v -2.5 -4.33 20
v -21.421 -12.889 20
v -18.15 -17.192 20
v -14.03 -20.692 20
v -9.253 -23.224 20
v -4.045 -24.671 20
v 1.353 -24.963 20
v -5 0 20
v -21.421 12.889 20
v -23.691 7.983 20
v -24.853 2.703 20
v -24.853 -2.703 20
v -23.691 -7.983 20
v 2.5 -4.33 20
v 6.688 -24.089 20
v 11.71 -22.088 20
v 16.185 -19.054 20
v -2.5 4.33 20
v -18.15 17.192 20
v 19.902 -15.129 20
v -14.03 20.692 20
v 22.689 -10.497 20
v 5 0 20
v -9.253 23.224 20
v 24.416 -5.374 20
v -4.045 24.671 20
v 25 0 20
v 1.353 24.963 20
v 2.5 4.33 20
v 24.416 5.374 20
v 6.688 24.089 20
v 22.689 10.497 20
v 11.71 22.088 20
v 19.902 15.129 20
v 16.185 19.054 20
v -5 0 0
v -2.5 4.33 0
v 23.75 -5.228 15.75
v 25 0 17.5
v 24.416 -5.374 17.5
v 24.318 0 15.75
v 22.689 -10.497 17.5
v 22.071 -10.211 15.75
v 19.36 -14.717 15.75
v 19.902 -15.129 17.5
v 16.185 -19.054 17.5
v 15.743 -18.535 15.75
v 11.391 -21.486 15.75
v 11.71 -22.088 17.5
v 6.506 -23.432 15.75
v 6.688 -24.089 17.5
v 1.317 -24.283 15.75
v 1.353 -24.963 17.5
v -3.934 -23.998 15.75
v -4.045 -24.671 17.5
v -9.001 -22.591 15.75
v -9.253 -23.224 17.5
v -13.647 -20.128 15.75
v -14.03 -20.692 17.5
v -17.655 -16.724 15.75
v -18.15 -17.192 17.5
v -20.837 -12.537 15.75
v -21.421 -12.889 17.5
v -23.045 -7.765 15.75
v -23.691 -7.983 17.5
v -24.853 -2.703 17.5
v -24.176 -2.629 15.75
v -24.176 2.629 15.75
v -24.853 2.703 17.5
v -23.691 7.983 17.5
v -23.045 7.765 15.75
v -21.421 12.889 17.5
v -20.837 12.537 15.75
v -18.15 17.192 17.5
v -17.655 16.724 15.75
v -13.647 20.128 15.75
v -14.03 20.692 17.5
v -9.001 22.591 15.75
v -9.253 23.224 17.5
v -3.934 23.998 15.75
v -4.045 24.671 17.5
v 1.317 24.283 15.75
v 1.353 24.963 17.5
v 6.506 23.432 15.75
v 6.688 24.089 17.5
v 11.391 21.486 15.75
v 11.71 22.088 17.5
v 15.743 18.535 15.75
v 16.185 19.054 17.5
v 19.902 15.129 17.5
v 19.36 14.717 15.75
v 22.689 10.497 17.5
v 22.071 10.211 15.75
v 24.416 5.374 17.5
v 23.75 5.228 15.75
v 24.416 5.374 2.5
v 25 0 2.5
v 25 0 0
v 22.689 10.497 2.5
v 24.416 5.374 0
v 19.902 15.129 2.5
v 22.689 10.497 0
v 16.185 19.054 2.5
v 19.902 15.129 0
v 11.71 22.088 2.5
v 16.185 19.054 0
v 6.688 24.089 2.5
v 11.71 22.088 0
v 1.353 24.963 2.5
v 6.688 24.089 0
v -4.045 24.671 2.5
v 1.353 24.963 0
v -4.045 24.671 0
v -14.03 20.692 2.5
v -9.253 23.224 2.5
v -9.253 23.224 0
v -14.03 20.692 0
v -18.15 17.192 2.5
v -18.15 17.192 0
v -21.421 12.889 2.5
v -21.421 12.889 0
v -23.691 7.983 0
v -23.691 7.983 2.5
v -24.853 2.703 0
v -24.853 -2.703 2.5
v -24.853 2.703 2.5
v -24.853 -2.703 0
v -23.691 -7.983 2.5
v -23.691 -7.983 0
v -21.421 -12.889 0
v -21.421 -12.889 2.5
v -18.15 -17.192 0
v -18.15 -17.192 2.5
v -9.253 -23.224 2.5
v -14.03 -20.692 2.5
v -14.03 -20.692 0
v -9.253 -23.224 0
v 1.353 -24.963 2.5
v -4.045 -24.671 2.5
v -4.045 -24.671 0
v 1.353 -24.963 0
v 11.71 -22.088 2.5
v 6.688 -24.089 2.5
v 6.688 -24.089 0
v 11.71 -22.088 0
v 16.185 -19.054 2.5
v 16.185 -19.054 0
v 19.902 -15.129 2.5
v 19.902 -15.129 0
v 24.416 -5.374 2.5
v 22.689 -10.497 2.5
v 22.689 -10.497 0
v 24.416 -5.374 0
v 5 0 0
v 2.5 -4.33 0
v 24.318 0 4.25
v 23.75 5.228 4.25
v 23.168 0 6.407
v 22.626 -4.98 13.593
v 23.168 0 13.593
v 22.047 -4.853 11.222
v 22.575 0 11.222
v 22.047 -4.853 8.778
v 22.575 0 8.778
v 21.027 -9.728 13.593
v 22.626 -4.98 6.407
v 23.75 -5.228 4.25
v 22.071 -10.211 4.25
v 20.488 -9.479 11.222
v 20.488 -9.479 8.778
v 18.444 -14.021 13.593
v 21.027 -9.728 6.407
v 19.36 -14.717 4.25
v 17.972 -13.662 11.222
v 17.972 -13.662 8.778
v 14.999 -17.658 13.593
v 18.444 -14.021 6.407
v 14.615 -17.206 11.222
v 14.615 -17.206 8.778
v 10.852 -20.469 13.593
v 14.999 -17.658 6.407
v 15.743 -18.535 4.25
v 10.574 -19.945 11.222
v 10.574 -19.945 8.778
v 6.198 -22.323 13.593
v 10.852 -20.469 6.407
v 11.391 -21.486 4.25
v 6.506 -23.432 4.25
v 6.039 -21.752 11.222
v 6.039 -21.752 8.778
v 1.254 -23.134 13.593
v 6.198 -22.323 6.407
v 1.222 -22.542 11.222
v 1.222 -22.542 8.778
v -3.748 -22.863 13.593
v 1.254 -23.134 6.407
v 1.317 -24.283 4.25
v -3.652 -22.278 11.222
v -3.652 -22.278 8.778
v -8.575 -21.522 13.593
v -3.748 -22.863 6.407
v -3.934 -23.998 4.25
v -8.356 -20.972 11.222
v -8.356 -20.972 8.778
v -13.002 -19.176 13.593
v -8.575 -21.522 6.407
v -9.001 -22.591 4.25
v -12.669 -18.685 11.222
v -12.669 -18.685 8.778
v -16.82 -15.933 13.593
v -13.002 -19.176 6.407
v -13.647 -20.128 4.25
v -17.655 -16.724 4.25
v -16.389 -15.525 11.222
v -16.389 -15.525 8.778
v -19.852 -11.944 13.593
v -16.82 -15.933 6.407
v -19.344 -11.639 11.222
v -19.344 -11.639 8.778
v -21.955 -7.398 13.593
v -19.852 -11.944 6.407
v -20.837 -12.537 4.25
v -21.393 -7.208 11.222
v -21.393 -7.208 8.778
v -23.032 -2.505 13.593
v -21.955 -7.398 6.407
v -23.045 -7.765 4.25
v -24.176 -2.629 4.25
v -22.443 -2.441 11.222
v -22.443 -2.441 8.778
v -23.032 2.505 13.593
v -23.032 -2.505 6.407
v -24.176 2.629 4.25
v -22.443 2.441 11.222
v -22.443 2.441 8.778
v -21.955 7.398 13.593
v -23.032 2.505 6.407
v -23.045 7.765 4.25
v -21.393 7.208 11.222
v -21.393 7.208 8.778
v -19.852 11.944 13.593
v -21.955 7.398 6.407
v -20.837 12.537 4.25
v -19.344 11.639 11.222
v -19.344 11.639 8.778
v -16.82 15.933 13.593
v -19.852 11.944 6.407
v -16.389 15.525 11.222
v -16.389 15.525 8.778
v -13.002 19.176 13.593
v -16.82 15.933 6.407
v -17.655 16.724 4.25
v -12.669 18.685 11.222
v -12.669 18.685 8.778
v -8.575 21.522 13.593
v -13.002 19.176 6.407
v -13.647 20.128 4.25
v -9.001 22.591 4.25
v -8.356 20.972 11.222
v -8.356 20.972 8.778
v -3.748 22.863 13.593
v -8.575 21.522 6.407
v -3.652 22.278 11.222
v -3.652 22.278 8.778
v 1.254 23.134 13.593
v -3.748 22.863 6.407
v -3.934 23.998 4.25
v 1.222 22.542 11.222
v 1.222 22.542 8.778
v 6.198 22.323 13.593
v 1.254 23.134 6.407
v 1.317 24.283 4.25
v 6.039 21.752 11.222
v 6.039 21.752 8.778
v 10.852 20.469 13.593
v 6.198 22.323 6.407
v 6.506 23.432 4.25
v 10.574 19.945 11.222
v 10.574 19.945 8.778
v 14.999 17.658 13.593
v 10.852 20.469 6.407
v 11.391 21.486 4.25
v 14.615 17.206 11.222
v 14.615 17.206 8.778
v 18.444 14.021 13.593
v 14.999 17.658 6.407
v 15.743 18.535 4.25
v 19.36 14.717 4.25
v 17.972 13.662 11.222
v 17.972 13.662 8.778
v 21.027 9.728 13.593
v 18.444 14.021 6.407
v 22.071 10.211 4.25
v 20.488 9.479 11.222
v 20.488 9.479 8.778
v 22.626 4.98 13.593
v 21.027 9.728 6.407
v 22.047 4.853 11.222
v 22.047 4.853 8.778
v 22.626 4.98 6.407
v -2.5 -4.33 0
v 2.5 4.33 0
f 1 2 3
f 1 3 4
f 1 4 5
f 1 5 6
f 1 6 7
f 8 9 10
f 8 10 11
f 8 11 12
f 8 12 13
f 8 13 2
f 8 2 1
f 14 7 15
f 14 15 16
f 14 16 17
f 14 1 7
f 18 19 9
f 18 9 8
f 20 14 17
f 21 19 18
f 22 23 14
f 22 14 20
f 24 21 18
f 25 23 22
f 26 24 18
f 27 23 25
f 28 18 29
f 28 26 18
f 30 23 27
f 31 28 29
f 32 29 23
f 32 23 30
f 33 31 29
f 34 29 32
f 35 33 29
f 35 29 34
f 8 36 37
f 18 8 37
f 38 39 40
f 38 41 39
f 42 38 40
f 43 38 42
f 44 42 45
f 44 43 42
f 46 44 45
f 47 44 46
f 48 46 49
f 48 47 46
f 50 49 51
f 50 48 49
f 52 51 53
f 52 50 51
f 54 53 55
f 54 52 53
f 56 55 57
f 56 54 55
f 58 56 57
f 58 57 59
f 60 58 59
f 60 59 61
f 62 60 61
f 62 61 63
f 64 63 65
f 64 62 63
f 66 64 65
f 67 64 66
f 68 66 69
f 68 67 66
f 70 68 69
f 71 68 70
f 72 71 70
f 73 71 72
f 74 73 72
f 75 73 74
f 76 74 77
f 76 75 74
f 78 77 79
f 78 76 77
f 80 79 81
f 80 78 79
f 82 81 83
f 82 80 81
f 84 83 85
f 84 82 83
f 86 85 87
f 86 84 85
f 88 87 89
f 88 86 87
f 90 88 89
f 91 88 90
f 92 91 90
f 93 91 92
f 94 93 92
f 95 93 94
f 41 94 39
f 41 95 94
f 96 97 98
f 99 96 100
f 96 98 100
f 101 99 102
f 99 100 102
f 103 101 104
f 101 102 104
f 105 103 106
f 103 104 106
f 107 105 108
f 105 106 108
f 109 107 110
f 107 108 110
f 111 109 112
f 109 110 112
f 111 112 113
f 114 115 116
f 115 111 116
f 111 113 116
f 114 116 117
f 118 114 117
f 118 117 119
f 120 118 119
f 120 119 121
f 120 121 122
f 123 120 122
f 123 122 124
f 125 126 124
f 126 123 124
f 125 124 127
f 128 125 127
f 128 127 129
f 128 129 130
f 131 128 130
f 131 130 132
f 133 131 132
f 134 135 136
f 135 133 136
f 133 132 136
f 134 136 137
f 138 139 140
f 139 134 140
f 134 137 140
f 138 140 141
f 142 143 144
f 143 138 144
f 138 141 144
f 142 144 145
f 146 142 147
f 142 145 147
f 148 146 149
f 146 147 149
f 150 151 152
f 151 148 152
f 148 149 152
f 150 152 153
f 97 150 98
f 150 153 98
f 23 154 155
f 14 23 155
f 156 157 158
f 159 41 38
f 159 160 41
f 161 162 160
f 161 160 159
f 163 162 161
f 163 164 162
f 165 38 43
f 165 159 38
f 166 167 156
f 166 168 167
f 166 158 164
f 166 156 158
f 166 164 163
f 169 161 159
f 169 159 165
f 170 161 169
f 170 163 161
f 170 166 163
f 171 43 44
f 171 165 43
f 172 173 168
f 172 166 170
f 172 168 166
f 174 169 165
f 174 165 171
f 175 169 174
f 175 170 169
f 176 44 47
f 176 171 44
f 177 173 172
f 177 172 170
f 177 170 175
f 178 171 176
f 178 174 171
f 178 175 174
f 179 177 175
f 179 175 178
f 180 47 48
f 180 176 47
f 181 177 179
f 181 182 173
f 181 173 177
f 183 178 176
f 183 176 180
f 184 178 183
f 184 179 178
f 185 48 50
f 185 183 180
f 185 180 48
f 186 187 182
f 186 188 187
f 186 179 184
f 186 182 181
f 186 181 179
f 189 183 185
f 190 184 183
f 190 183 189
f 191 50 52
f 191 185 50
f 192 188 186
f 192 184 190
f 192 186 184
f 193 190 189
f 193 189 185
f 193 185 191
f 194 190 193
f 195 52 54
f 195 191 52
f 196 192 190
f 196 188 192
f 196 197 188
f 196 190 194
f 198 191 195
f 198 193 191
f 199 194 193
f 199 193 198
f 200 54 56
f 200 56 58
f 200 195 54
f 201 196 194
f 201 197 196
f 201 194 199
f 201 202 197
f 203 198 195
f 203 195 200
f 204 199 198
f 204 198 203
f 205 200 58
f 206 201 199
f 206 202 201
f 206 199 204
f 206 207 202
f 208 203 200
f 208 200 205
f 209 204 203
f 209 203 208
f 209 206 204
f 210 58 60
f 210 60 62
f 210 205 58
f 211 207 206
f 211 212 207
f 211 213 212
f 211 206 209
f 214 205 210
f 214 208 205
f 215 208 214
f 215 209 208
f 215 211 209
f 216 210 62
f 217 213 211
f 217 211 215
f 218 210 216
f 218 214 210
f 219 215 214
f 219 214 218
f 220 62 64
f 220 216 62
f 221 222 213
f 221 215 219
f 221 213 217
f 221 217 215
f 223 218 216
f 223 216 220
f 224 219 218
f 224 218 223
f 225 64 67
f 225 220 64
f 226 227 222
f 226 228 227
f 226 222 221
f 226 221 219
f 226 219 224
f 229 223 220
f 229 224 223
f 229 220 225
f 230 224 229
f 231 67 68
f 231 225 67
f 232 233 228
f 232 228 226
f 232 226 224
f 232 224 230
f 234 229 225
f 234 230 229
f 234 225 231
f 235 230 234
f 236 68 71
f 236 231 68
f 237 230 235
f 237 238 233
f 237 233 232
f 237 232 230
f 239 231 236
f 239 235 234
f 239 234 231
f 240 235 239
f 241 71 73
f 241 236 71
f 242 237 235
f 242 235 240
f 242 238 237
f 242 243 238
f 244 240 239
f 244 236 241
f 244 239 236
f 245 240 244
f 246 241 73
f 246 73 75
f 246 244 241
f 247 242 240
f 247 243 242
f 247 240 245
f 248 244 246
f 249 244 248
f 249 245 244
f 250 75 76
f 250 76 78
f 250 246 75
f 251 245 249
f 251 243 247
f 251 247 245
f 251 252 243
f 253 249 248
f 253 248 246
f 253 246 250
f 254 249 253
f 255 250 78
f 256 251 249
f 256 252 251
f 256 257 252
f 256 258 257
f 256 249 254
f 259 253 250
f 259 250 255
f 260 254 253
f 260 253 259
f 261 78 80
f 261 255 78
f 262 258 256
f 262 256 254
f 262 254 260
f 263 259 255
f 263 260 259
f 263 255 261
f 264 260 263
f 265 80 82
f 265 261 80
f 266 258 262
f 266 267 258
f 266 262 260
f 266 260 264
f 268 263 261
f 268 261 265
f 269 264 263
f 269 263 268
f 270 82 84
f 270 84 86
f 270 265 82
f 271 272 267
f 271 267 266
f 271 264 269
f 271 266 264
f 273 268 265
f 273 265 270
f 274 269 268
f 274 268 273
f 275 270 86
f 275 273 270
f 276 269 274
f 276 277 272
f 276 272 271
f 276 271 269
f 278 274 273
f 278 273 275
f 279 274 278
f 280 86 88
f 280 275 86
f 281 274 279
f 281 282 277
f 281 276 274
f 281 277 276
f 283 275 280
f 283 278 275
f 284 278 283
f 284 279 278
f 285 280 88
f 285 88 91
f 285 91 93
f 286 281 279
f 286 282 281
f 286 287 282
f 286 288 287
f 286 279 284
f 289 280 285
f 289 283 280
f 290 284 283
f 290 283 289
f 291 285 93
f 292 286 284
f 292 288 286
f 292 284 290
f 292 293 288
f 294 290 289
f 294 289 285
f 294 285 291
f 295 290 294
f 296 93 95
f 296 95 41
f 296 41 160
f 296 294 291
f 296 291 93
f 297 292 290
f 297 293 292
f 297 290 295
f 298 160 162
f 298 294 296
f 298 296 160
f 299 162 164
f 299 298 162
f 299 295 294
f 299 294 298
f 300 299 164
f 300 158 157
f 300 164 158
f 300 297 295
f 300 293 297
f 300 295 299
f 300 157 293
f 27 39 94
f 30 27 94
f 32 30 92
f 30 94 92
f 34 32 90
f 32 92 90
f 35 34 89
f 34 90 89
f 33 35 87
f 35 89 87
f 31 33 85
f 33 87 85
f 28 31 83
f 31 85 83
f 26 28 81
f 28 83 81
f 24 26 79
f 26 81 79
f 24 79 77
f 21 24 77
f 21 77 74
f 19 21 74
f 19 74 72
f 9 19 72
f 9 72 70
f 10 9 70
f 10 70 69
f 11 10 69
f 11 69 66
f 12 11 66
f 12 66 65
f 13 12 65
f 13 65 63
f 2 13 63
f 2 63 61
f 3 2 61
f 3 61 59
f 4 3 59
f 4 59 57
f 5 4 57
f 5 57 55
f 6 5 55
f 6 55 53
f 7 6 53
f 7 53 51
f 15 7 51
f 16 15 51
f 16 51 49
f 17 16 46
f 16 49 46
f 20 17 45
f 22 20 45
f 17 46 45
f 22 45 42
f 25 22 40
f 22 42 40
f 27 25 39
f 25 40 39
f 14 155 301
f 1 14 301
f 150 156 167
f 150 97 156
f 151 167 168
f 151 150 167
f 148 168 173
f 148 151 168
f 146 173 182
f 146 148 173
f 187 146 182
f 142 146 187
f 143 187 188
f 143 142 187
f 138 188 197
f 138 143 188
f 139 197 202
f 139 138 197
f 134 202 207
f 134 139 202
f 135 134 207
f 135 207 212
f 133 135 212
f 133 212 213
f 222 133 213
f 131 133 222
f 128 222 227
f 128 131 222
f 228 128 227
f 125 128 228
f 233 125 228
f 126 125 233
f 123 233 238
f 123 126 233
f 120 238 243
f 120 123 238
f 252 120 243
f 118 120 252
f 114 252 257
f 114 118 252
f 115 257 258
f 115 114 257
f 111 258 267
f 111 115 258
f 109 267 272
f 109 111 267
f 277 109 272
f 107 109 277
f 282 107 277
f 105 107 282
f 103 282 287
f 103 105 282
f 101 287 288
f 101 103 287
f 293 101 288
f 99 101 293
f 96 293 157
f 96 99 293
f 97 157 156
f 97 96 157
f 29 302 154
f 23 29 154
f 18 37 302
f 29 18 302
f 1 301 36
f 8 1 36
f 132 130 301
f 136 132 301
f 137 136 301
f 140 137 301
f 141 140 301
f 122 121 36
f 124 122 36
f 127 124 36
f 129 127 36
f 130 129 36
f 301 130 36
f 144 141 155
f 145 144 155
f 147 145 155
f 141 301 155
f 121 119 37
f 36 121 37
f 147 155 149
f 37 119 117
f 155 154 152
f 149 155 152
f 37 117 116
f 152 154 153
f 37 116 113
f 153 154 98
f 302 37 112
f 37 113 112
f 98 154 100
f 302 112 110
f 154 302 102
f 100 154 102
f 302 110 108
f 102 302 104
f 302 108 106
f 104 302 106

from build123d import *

# Parameters (mm, degrees)
SKETCH1_R           = 25
BOSS_EXTRUDE1_DEPTH = 20
CUT_EXTRUDE1_DEPTH  = 41.620192023


with BuildPart() as part:
    # Sketch1 → Boss-Extrude1 (new body)
    with BuildSketch(Plane.XY):
        Circle(SKETCH1_R)
    extrude(amount=BOSS_EXTRUDE1_DEPTH)

    # Sketch2 → Cut-Revolve1 (revolve, cut)
    with BuildSketch(Plane(origin=(0, 0, 0), x_dir=(0, 0, -1), z_dir=(1, 0, 0)), mode=Mode.PRIVATE) as cut_revolve1_sk:
        with BuildLine():
            Line((-17.5, 25), (-15.75, 24.318465914))
            ThreePointArc((-15.75, 24.318465914), (-10, 22.5), (-4.25, 24.318465914))
            Line((-4.25, 24.318465914), (-2.5, 25))
            Line((-2.5, 25), (-17.5, 25))
        make_face()
    revolve(cut_revolve1_sk.sketch.rotate(Axis((0, 0, 20), (0, 0, -1)), 90), axis=Axis((0, 0, 20), (0, 0, -1)), mode=Mode.SUBTRACT)

    # Sketch3 → Cut-Extrude1 (cut, through all)
    with BuildSketch(Plane(origin=(0, 0, 0), x_dir=(-1, 0, 0), z_dir=(0, 0, -1))):
        Polygon((5, 0), (2.5, 4.330127019), (-2.5, 4.330127019), (-5, 0), (-2.5, -4.330127019), (2.5, -4.330127019), align=None)
    extrude(amount=-CUT_EXTRUDE1_DEPTH, mode=Mode.SUBTRACT)


solid = part.part
